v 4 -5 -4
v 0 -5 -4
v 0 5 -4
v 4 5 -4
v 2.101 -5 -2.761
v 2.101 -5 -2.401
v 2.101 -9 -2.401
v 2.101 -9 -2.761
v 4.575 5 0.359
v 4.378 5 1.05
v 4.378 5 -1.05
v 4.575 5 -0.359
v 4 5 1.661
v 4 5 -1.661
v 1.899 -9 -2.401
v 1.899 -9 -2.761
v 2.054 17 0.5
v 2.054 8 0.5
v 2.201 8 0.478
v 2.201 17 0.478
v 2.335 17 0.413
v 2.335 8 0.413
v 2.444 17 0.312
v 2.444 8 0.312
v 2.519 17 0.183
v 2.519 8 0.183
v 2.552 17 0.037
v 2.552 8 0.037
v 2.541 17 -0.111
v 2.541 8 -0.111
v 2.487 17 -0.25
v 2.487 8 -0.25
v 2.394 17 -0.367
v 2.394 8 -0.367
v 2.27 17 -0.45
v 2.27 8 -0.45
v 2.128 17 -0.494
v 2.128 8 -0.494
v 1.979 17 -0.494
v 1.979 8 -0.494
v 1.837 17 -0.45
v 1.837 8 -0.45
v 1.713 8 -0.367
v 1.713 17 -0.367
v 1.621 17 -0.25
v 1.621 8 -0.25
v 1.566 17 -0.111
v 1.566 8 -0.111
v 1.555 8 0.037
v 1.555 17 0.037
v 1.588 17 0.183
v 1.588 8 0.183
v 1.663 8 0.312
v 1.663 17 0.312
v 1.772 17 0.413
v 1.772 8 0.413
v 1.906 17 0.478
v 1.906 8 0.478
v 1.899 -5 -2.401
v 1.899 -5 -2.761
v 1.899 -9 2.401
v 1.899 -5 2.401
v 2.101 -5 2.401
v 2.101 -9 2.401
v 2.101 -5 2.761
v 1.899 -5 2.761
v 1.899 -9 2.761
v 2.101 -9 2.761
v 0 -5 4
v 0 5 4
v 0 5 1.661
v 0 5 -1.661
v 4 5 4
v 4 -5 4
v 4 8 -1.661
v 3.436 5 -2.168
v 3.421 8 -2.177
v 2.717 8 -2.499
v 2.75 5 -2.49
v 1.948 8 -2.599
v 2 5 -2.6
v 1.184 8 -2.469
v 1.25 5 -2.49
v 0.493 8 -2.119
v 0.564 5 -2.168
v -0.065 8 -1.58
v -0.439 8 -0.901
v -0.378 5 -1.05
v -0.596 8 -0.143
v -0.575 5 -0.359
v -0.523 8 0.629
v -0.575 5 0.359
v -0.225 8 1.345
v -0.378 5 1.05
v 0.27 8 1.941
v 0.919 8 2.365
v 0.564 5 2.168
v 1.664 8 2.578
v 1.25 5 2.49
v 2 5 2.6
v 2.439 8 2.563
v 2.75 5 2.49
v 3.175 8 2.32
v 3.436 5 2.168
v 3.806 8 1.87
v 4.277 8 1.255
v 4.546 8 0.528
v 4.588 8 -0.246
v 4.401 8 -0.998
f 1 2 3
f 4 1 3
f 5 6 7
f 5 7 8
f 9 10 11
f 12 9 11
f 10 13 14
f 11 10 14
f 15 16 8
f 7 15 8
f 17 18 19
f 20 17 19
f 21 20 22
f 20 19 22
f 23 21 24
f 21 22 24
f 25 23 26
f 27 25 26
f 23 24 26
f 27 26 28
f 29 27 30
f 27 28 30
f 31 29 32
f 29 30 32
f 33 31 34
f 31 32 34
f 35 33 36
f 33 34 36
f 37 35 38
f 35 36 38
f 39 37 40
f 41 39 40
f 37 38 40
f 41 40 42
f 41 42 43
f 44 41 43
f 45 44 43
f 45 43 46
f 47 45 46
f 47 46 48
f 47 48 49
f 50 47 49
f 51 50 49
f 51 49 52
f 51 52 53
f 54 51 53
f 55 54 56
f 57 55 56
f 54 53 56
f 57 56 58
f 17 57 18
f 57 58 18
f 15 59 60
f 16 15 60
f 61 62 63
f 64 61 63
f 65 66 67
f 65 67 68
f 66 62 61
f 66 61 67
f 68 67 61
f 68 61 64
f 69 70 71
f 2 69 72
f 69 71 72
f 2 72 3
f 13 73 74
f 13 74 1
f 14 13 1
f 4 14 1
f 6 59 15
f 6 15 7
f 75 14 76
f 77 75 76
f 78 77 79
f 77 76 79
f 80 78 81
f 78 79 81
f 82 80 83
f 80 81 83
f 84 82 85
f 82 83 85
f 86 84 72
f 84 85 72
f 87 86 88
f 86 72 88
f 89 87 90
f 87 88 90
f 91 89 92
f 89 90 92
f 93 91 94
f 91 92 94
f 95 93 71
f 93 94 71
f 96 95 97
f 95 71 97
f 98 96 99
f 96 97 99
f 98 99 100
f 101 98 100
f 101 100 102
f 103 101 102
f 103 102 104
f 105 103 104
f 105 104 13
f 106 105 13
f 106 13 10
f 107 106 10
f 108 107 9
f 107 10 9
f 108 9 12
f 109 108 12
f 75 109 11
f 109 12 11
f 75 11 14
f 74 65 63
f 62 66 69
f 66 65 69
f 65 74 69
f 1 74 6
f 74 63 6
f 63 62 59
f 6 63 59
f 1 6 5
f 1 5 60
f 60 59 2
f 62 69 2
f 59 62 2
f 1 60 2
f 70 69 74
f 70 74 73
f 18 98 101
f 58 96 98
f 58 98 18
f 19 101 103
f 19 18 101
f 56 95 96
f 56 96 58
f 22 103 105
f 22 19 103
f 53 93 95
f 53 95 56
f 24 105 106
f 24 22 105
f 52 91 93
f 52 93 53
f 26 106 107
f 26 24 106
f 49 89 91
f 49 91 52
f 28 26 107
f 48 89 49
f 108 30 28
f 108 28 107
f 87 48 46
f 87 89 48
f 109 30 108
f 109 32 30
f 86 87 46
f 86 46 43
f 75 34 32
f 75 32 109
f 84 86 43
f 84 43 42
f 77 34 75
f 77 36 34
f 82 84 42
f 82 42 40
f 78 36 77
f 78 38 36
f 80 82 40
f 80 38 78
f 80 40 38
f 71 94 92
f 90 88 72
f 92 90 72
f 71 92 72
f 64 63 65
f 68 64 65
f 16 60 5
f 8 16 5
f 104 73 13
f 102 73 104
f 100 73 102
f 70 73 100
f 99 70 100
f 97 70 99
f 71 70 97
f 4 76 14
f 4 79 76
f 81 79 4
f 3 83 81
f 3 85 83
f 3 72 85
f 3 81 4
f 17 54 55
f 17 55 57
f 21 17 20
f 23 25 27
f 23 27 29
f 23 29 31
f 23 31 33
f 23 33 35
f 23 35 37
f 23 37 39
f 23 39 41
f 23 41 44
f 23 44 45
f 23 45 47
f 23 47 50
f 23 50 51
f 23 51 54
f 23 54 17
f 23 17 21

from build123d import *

# Parameters (mm, degrees)
ESQUISSE1_W        = 8
ESQUISSE1_H        = 10
BOSS_EXTRU_1_DEPTH = 4
ESQUISSE2_W        = 0.201235696
ESQUISSE2_H        = 0.359902984
BOSS_EXTRU_2_DEPTH = 4
ESQUISSE3_R        = 2.6
BOSS_EXTRU_3_DEPTH = 3
ESQUISSE4_R        = 0.5
BOSS_EXTRU_4_DEPTH = 9


with BuildPart() as part:
    # Esquisse1 → Boss.-Extru.1 (new body)
    with BuildSketch(Plane(origin=(0, 0, 0), x_dir=(0, 0, -1), z_dir=(1, 0, 0))):
        Rectangle(ESQUISSE1_W, ESQUISSE1_H)
    extrude(amount=BOSS_EXTRU_1_DEPTH)

    # Esquisse2 → Boss.-Extru.2 (add)
    with BuildSketch(Plane.XZ.offset(5)):
        with Locations((2, 2.580715462)):
            Rectangle(ESQUISSE2_W, ESQUISSE2_H)
    boss_extru_2 = extrude(amount=BOSS_EXTRU_2_DEPTH)

    # Symétrie1: Boss.-Extru.2 across plane
    add(boss_extru_2.mirror(Plane.XY))

    # Esquisse3 → Boss.-Extru.3 (add)
    with BuildSketch(Plane(origin=(0, 5, 0), x_dir=(1, 0, 0), z_dir=(0, 1, 0))):
        with Locations(Location((2, 0, 0), (0, 0, 39.715137232))):
            Circle(ESQUISSE3_R)
    extrude(amount=BOSS_EXTRU_3_DEPTH)

    # Esquisse4 → Boss.-Extru.4 (add)
    with BuildSketch(Plane(origin=(0, 8, 0), x_dir=(1, 0, 0), z_dir=(0, 1, 0))):
        with Locations(Location((2.053541677, 0, 0), (0, 0, 270))):
            Circle(ESQUISSE4_R)
    extrude(amount=BOSS_EXTRU_4_DEPTH)


solid = part.part
